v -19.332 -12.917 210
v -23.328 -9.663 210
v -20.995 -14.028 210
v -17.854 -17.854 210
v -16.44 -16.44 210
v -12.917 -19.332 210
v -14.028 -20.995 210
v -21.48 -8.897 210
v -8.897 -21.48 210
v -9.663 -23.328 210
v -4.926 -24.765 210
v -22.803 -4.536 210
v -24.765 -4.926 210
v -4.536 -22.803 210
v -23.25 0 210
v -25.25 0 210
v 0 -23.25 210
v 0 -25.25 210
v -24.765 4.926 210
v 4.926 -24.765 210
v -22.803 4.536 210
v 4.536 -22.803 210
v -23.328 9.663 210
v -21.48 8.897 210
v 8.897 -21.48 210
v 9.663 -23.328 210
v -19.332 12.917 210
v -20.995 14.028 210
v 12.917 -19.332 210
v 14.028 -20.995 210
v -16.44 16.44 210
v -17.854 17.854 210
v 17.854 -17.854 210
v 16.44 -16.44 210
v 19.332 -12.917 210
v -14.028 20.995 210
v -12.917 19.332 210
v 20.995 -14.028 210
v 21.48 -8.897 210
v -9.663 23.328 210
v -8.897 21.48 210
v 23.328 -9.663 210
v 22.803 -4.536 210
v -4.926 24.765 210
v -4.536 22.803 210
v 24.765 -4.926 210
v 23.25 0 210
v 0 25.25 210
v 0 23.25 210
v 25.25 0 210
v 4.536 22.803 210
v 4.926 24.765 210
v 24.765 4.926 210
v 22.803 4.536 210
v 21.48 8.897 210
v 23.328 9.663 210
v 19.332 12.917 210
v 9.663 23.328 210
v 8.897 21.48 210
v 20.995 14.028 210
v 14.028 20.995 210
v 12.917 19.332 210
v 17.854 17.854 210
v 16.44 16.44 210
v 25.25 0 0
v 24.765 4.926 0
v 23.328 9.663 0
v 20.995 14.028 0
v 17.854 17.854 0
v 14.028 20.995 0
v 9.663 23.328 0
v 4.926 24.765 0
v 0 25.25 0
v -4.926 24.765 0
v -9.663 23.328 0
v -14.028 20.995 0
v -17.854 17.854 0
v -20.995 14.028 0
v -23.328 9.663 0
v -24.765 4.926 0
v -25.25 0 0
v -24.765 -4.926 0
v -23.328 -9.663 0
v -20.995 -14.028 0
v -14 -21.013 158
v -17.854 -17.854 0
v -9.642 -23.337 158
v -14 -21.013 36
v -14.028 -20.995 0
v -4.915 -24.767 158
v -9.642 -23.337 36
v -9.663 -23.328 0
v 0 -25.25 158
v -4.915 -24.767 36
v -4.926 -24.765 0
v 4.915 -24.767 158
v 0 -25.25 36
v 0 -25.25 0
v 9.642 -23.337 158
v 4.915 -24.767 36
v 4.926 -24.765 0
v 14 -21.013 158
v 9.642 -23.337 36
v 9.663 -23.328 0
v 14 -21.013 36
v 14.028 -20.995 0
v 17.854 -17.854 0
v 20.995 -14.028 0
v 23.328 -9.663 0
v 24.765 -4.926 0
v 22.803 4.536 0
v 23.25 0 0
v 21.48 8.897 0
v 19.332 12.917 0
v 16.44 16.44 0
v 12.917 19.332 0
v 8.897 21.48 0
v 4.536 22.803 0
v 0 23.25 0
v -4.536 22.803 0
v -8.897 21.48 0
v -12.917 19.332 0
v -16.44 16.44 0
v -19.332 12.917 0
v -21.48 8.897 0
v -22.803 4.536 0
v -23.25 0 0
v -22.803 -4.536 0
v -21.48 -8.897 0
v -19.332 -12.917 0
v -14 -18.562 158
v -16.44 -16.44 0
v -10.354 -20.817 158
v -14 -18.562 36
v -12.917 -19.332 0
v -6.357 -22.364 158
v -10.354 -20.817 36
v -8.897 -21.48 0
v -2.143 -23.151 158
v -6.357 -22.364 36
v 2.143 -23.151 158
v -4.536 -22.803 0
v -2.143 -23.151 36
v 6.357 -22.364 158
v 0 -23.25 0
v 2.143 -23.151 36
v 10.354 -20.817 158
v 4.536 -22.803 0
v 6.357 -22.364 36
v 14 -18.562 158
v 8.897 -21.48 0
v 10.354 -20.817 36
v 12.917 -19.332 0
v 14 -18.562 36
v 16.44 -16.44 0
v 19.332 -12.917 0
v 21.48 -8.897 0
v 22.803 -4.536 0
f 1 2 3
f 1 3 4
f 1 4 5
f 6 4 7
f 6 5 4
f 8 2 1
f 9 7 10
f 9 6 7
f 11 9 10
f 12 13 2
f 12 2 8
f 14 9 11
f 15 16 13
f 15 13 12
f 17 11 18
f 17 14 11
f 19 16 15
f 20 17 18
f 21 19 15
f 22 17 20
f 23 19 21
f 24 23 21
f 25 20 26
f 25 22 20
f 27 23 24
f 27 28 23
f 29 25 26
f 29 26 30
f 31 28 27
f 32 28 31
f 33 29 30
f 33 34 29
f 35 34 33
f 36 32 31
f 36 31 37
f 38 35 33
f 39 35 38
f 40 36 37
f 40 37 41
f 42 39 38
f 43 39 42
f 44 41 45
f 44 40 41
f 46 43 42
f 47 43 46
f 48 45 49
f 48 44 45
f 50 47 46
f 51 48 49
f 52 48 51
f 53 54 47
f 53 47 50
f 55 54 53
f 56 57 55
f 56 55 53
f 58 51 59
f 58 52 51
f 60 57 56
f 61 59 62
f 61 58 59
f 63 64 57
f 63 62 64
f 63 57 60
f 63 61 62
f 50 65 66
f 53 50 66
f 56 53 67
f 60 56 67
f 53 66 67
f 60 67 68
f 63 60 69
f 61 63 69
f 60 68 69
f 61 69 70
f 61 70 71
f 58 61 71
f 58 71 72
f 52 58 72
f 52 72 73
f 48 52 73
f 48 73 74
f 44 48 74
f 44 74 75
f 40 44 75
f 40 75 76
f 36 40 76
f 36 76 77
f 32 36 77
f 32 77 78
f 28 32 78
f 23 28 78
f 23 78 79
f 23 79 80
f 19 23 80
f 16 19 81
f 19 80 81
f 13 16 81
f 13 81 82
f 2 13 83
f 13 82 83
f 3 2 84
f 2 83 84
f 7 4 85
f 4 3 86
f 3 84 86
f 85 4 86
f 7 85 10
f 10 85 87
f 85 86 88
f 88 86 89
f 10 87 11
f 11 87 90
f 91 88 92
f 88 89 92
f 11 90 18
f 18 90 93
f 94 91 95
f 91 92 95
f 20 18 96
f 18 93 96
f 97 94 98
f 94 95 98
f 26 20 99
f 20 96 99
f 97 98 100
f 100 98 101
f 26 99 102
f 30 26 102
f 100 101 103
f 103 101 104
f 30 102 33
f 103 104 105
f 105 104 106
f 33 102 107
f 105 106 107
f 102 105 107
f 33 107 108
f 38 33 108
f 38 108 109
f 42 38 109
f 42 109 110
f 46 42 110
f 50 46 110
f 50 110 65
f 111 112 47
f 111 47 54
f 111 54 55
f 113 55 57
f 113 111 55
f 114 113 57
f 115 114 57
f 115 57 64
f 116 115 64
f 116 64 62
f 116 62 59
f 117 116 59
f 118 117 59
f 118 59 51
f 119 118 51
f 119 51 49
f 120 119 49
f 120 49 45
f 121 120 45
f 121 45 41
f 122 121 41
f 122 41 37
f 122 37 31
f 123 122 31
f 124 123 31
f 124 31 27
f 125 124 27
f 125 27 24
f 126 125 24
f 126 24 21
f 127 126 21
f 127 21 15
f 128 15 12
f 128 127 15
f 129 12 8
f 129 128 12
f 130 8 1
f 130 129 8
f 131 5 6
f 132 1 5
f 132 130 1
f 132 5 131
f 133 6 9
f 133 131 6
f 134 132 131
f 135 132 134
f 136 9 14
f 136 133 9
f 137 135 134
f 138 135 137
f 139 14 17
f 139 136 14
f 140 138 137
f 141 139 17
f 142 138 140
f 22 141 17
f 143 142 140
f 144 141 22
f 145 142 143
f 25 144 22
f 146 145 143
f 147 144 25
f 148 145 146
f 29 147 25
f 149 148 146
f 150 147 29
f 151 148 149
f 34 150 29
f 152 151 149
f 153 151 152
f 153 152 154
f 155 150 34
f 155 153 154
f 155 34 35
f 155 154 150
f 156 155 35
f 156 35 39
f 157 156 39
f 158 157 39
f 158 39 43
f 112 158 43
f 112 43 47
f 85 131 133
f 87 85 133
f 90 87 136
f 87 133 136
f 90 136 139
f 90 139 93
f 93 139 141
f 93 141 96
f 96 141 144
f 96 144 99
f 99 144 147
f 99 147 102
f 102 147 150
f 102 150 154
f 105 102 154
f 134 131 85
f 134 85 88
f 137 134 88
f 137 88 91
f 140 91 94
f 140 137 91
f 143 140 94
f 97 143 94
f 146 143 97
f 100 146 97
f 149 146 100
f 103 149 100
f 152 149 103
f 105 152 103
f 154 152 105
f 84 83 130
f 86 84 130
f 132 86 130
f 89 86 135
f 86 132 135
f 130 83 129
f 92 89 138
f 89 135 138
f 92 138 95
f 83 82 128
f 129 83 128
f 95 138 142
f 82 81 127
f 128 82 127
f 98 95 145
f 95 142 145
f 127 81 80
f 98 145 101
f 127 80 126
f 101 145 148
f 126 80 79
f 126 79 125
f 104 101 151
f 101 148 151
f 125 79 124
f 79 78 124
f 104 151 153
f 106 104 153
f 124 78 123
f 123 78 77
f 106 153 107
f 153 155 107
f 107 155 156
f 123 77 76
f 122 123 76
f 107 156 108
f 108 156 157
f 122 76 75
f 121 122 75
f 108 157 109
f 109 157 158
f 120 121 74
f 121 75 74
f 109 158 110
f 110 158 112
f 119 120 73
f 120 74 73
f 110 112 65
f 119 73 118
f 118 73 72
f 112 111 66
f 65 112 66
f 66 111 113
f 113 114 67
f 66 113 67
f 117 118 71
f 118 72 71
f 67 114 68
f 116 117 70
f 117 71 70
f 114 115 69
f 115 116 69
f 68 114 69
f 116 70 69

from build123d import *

# Parameters (mm, degrees)
SKETCH1_R               = 25.25
SKETCH1_R_2             = 23.25
BOSS_EXTRUDE1_DEPTH     = 210
CUT_EXTRUDE1_REACH      = 215.014
CUT_EXTRUDE1_END_RADIUS = 25.25
SKETCH3_W               = 28
SKETCH3_H               = 122


with BuildPart() as part:
    # Sketch1 → Boss-Extrude1 (new body)
    with BuildSketch(Plane.XY):
        Circle(SKETCH1_R)
        Circle(SKETCH1_R_2, mode=Mode.SUBTRACT)
    extrude(amount=BOSS_EXTRUDE1_DEPTH)

    # Cut-Extrude1: up to this cylinder (the profile starts inside it)
    cut_extrude1_end = Plane(origin=(0, 0, 97), z_dir=(0, 0, -1)) * Cylinder(CUT_EXTRUDE1_END_RADIUS, 481.528, mode=Mode.PRIVATE)
    # Sketch3 → Cut-Extrude1 (cut, up to the surface)
    with BuildSketch(Plane(origin=(0, 0, 0), x_dir=(1, 0, 0), z_dir=(0, 1, 0)), mode=Mode.PRIVATE) as cut_extrude1_sk1:
        with Locations((0, -97)):
            Rectangle(SKETCH3_W, SKETCH3_H)
    cut_extrude1_tool1 = extrude(cut_extrude1_sk1.sketch, amount=-CUT_EXTRUDE1_REACH, mode=Mode.PRIVATE) & cut_extrude1_end
    add(cut_extrude1_tool1.solids().sort_by_distance((0, 0, 97))[0], mode=Mode.SUBTRACT)


solid = part.part
